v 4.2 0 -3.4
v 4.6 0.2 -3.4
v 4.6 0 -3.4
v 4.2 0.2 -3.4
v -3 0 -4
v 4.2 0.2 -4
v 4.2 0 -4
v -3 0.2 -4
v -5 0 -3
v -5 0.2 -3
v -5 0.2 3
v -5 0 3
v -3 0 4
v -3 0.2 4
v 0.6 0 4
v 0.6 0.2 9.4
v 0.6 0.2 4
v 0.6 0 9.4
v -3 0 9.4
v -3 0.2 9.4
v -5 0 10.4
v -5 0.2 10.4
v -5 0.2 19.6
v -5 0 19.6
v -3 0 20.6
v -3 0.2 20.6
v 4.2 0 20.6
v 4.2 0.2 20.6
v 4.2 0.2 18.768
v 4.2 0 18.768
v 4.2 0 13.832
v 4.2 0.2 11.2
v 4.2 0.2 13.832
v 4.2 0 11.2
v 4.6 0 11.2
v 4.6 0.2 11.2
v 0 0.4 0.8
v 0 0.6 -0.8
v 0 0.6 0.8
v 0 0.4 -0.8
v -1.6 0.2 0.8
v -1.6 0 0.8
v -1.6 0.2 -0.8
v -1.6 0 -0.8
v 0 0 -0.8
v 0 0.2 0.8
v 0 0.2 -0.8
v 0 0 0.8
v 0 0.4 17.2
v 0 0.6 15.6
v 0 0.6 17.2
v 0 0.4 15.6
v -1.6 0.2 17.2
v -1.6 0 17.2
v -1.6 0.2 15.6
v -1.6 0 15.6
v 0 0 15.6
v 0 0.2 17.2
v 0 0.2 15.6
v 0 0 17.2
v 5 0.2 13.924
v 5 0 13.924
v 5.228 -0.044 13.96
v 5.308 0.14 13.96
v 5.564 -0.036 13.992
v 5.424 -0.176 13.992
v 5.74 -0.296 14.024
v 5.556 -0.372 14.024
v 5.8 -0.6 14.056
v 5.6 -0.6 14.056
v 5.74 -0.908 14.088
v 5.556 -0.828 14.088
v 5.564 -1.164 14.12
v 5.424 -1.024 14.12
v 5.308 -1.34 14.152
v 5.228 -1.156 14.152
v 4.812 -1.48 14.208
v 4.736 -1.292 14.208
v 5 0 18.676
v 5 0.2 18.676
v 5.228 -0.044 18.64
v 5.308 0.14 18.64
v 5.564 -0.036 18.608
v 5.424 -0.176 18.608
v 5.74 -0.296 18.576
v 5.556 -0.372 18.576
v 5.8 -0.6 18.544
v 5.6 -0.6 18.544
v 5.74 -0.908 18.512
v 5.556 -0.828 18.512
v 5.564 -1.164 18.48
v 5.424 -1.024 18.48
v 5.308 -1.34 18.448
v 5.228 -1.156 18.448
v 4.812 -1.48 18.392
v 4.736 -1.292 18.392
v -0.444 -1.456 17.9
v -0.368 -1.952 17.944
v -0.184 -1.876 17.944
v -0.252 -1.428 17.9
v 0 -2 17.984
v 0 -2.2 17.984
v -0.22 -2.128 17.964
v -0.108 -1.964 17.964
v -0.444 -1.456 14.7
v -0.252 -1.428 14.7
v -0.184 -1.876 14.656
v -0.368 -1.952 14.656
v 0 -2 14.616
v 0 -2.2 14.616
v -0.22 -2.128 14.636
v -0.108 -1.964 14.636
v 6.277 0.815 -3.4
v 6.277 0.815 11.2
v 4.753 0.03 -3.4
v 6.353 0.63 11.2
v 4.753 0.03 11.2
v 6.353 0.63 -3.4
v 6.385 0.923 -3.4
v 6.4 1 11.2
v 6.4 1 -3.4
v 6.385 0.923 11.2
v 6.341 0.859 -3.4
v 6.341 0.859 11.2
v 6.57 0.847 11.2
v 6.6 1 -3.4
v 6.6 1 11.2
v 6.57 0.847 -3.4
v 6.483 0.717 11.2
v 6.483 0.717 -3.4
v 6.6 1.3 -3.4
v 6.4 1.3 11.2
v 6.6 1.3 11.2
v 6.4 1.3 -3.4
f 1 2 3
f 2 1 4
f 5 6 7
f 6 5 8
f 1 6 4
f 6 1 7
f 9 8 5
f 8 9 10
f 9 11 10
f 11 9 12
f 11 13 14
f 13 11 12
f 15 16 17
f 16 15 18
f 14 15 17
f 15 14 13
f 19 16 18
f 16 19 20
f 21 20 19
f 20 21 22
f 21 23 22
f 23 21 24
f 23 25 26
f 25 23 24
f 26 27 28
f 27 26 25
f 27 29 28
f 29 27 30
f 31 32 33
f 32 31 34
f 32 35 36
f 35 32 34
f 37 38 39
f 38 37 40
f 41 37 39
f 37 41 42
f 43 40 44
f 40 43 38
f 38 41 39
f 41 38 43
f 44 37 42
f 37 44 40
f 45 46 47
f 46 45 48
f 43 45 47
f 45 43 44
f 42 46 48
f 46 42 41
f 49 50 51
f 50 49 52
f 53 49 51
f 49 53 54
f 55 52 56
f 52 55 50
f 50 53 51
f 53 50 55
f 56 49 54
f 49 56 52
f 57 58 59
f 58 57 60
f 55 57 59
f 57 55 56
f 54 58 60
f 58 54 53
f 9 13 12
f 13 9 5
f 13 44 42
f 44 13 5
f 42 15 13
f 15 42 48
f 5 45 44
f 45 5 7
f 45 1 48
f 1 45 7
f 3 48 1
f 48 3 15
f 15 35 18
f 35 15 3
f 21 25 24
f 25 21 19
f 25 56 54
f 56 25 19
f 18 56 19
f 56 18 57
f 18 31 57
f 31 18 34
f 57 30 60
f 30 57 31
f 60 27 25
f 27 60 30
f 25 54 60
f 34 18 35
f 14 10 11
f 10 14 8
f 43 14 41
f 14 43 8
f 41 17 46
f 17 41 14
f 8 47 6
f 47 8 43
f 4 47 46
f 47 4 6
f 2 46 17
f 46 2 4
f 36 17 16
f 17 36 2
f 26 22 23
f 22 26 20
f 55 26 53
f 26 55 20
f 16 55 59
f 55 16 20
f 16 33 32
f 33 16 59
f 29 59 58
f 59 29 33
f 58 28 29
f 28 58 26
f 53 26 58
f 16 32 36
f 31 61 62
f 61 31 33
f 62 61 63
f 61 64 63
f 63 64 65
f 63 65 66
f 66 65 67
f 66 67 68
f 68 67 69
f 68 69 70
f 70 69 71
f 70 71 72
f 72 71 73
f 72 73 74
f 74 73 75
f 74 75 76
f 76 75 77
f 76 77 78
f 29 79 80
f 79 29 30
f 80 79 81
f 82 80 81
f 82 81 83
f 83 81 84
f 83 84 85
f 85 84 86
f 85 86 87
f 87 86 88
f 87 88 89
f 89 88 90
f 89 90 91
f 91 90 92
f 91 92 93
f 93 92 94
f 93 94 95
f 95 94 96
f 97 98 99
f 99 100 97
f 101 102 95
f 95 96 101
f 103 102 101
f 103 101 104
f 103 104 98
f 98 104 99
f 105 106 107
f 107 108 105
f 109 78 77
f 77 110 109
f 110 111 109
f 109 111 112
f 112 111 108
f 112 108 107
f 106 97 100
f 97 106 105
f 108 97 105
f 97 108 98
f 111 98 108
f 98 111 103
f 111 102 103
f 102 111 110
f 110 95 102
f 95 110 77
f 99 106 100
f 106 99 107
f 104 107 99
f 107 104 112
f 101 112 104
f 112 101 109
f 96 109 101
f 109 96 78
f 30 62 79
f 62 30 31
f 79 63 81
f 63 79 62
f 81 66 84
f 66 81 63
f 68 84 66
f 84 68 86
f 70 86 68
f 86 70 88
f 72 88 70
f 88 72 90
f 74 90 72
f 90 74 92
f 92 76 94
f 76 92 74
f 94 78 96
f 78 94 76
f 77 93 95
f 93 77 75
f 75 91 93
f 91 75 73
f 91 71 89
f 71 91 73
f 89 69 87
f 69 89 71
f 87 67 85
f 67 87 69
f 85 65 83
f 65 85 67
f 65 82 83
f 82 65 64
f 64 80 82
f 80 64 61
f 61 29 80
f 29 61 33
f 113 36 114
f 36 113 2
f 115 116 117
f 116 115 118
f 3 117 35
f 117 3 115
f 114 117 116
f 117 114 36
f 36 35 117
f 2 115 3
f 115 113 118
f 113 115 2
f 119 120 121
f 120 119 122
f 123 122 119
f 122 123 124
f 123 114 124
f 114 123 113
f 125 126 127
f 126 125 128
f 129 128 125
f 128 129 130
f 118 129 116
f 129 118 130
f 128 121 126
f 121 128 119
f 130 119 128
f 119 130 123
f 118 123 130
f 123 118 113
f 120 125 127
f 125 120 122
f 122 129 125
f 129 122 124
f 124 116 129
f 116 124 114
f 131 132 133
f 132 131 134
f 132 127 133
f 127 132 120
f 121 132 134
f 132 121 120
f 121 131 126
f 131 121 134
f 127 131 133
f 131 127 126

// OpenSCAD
// file: ../p/3-16edge.scad
use <../lib.scad>
function ldraw_lib__3_16edge() = [
// 0 Circle 0.1875
// 0 Name: 3-16edge.dat
// 0 Author: Donald Sutter [technog]
// 0 !LDRAW_ORG Primitive UPDATE 2017-01
// 0 !LICENSE Licensed under CC BY 4.0 : see CAreadme.txt
// 
// 0 BFC CERTIFY CCW
  [0,"BFC","CERTIFY"],
  [0,"BFC","CCW"],
// 
// 0 !HISTORY 2004-03-02 [PTadmin] Official Update 2004-01
// 0 !HISTORY 2007-06-24 [PTadmin] Header formatted for Contributor Agreement
// 0 !HISTORY 2008-07-01 [PTadmin] Official Update 2008-01
// 0 !HISTORY 2017-01-15 [Steffen] BFCed
// 0 !HISTORY 2017-12-30 [PTadmin] Official Update 2017-01
// 
// 
// 2 24 1 0 0 0.9239 0 0.3827
  [2,24,1,0,0,0.9239,0,0.3827],
// 2 24 0.9239 0 0.3827 0.7071 0 0.7071
  [2,24,0.9239,0,0.3827,0.7071,0,0.7071],
// 2 24 0.7071 0 0.7071 0.3827 0 0.9239
  [2,24,0.7071,0,0.7071,0.3827,0,0.9239],
];
module ldraw_lib__3_16edge(step=0, col=false, unit=2/5, alt=false, line=0.2, solid=!$preview)
    makepoly(ldraw_lib__3_16edge(), step=step, col=col, unit=unit, alt=alt, line=line, solid=solid);
ldraw_lib__3_16edge(line=0.2);
// file: ../p/3-16cyli.scad
use <../lib.scad>
function ldraw_lib__3_16cyli() = [
// 0 Cylinder 0.1875
// 0 Name: 3-16cyli.dat
// 0 Author: Mark Kennedy [mkennedy]
// 0 !LDRAW_ORG Primitive UPDATE 2005-01
// 0 !LICENSE Licensed under CC BY 4.0 : see CAreadme.txt
// 
// 0 BFC CERTIFY CCW
  [0,"BFC","CERTIFY"],
  [0,"BFC","CCW"],
// 
// 0 !HISTORY 2004-03-02 [PTadmin] Official Update 2004-01
// 0 !HISTORY 2004-12-11 [nielsk] Recreated using Primitive Generator, Edge lines fixed, BFC changed to CCW
// 0 !HISTORY 2005-12-28 [PTadmin] Official Update 2005-01
// 0 !HISTORY 2007-06-24 [PTadmin] Header formatted for Contributor Agreement
// 0 !HISTORY 2008-07-01 [PTadmin] Official Update 2008-01
// 
// 
// 4 16 .9239 1 .3827 .9239 0 .3827 1 0 0 1 1 0
  [4,16,.9239,1,.3827,.9239,0,.3827,1,0,0,1,1,0],
// 4 16 .7071 1 .7071 .7071 0 .7071 .9239 0 .3827 .9239 1 .3827
  [4,16,.7071,1,.7071,.7071,0,.7071,.9239,0,.3827,.9239,1,.3827],
// 4 16 .3827 1 .9239 .3827 0 .9239 .7071 0 .7071 .7071 1 .7071
  [4,16,.3827,1,.9239,.3827,0,.9239,.7071,0,.7071,.7071,1,.7071],
// 5 24 1 1 0 1 0 0 1 1 -.4142 .9239 1 .3827
  [5,24,1,1,0,1,0,0,1,1,-.4142,.9239,1,.3827],
// 5 24 .9239 1 .3827 .9239 0 .3827 1 1 0 .7071 1 .7071
  [5,24,.9239,1,.3827,.9239,0,.3827,1,1,0,.7071,1,.7071],
// 5 24 .7071 1 .7071 .7071 0 .7071 .9239 1 .3827 .3827 1 .9239
  [5,24,.7071,1,.7071,.7071,0,.7071,.9239,1,.3827,.3827,1,.9239],
// 5 24 .3827 1 .9239 .3827 0 .9239 .7071 1 .7071 0 1 1.0824
  [5,24,.3827,1,.9239,.3827,0,.9239,.7071,1,.7071,0,1,1.0824],
// 0
];
module ldraw_lib__3_16cyli(step=0, col=false, unit=2/5, alt=false, line=0.2, solid=!$preview)
    makepoly(ldraw_lib__3_16cyli(), step=step, col=col, unit=unit, alt=alt, line=line, solid=solid);
ldraw_lib__3_16cyli(line=0.2);
// file: ../p/rect2p.scad
use <../lib.scad>
function ldraw_lib__rect2p() = [
// 0 Rectangle with 2 Parallel Edges
// 0 Name: rect2p.dat
// 0 Author: Donald Sutter [technog]
// 0 !LDRAW_ORG Primitive UPDATE 2010-01
// 0 !LICENSE Licensed under CC BY 4.0 : see CAreadme.txt
// 
// 0 BFC CERTIFY CCW
  [0,"BFC","CERTIFY"],
  [0,"BFC","CCW"],
// 
// 0 !HISTORY 2003-08-01 [PTadmin] Official Update 2003-02
// 0 !HISTORY 2007-06-24 [PTadmin] Header formatted for Contributor Agreement
// 0 !HISTORY 2008-07-01 [PTadmin] Official Update 2008-01
// 0 !HISTORY 2010-01-17 [mikeheide] changed winding to CCW
// 0 !HISTORY 2010-04-05 [PTadmin] Official Update 2010-01
// 
// 
// 2 24 1 0 1 -1 0 1
  [2,24,1,0,1,-1,0,1],
// 2 24 -1 0 -1 1 0 -1
  [2,24,-1,0,-1,1,0,-1],
// 4 16 -1 0 1 -1 0 -1 1 0 -1 1 0 1
  [4,16,-1,0,1,-1,0,-1,1,0,-1,1,0,1],
// 0
];
module ldraw_lib__rect2p(step=0, col=false, unit=2/5, alt=false, line=0.2, solid=!$preview)
    makepoly(ldraw_lib__rect2p(), step=step, col=col, unit=unit, alt=alt, line=line, solid=solid);
ldraw_lib__rect2p(line=0.2);
// file: ../p/rect.scad
use <../lib.scad>
function ldraw_lib__rect() = [
// 0 Rectangle
// 0 Name: rect.dat
// 0 Author: James Jessiman
// 0 !LDRAW_ORG Primitive UPDATE 2010-01
// 0 !LICENSE Licensed under CC BY 4.0 : see CAreadme.txt
// 
// 0 BFC CERTIFY CCW
  [0,"BFC","CERTIFY"],
  [0,"BFC","CCW"],
// 
// 0 !HISTORY 2002-04-05 [hafhead] Added BFC statement
// 0 !HISTORY 2002-04-25 [PTadmin] Official Update 2002-02
// 0 !HISTORY 2007-06-24 [PTadmin] Header formatted for Contributor Agreement
// 0 !HISTORY 2008-07-01 [PTadmin] Official Update 2008-01
// 0 !HISTORY 2010-01-17 [mikeheide] changed winding to CCW
// 0 !HISTORY 2010-04-05 [PTadmin] Official Update 2010-01
// 
// 
// 2 24 1 0 1 -1 0 1
  [2,24,1,0,1,-1,0,1],
// 2 24 -1 0 1 -1 0 -1
  [2,24,-1,0,1,-1,0,-1],
// 2 24 -1 0 -1 1 0 -1
  [2,24,-1,0,-1,1,0,-1],
// 2 24 1 0 -1 1 0 1
  [2,24,1,0,-1,1,0,1],
// 4 16 -1 0 1 -1 0 -1 1 0 -1 1 0 1
  [4,16,-1,0,1,-1,0,-1,1,0,-1,1,0,1],
// 0
];
module ldraw_lib__rect(step=0, col=false, unit=2/5, alt=false, line=0.2, solid=!$preview)
    makepoly(ldraw_lib__rect(), step=step, col=col, unit=unit, alt=alt, line=line, solid=solid);
ldraw_lib__rect(line=0.2);
// file: ../p/box5-4a.scad
use <../lib.scad>
function ldraw_lib__box5_4a() = [
// 0 Box with  5 Faces without  4 Adjacent Edges
// 0 Name: box5-4a.dat
// 0 Author: Willy Tschager [Holly-Wood]
// 0 !LDRAW_ORG Primitive UPDATE 2024-01
// 0 !LICENSE Licensed under CC BY 4.0 : see CAreadme.txt
// 
// 0 BFC CERTIFY CCW
  [0,"BFC","CERTIFY"],
  [0,"BFC","CCW"],
// 
// 0 !HISTORY 2009-05-02 [PTadmin] Official Update 2009-01
// 0 !HISTORY 2024-01-03 [Holly-Wood] Complete re-write, original by guyvivan
// 0 !HISTORY 2024-01-29 [OrionP] Official Update 2024-01
// 
// 2 24 -1 1 -1 -1 1 1
  [2,24,-1,1,-1,-1,1,1],
// 2 24 1 1 1 1 1 -1
  [2,24,1,1,1,1,1,-1],
// 2 24 -1 1 1 1 1 1
  [2,24,-1,1,1,1,1,1],
// 2 24 -1 1 -1 1 1 -1
  [2,24,-1,1,-1,1,1,-1],
// 4 16 1 1 1 1 1 -1 -1 1 -1 -1 1 1
  [4,16,1,1,1,1,1,-1,-1,1,-1,-1,1,1],
// 
// 2 24 -1 0 -1 -1 1 -1
  [2,24,-1,0,-1,-1,1,-1],
// 2 24 -1 1 1 -1 0 1
  [2,24,-1,1,1,-1,0,1],
// 4 16 -1 1 1 -1 1 -1 -1 0 -1 -1 0 1
  [4,16,-1,1,1,-1,1,-1,-1,0,-1,-1,0,1],
// 
// 2 24 1 0 -1 1 1 -1
  [2,24,1,0,-1,1,1,-1],
// 2 24 1 1 1 1 0 1
  [2,24,1,1,1,1,0,1],
// 4 16 1 1 -1 1 1 1 1 0 1 1 0 -1
  [4,16,1,1,-1,1,1,1,1,0,1,1,0,-1],
// 
// 4 16 1 1 1 -1 1 1 -1 0 1 1 0 1
  [4,16,1,1,1,-1,1,1,-1,0,1,1,0,1],
// 4 16 -1 1 -1 1 1 -1 1 0 -1 -1 0 -1
  [4,16,-1,1,-1,1,1,-1,1,0,-1,-1,0,-1],
];
module ldraw_lib__box5_4a(step=0, col=false, unit=2/5, alt=false, line=0.2, solid=!$preview)
    makepoly(ldraw_lib__box5_4a(), step=step, col=col, unit=unit, alt=alt, line=line, solid=solid);
ldraw_lib__box5_4a(line=0.2);
// file: ../p/box5-2p.scad
use <../lib.scad>
function ldraw_lib__box5_2p() = [
// 0 Box with  5 Faces without  2 Parallel Edges
// 0 Name: box5-2p.dat
// 0 Author: Willy Tschager [Holly-Wood]
// 0 !LDRAW_ORG Primitive UPDATE 2024-01
// 0 !LICENSE Licensed under CC BY 4.0 : see CAreadme.txt
// 
// 0 BFC CERTIFY CCW
  [0,"BFC","CERTIFY"],
  [0,"BFC","CCW"],
// 
// 0 !HISTORY 2012-03-30 [PTadmin] Official Update 2012-01
// 0 !HISTORY 2024-01-04 [Holly-Wood] Complete re-write, original by Brickaneer
// 0 !HISTORY 2024-01-29 [OrionP] Official Update 2024-01
// 
// 2 24 -1 1 1 1 1 1
  [2,24,-1,1,1,1,1,1],
// 2 24 -1 1 -1 -1 1 1
  [2,24,-1,1,-1,-1,1,1],
// 2 24 1 1 -1 -1 1 -1
  [2,24,1,1,-1,-1,1,-1],
// 2 24 1 1 1 1 1 -1
  [2,24,1,1,1,1,1,-1],
// 4 16 1 1 1 1 1 -1 -1 1 -1 -1 1 1
  [4,16,1,1,1,1,1,-1,-1,1,-1,-1,1,1],
// 
// 2 24 -1 1 1 -1 0 1
  [2,24,-1,1,1,-1,0,1],
// 2 24 -1 1 -1 -1 0 -1
  [2,24,-1,1,-1,-1,0,-1],
// 2 24 -1 0 -1 -1 0 1
  [2,24,-1,0,-1,-1,0,1],
// 4 16 -1 1 1 -1 1 -1 -1 0 -1 -1 0 1
  [4,16,-1,1,1,-1,1,-1,-1,0,-1,-1,0,1],
// 
// 2 24 1 1 1 1 0 1
  [2,24,1,1,1,1,0,1],
// 2 24 1 1 -1 1 0 -1
  [2,24,1,1,-1,1,0,-1],
// 2 24 1 0 1 1 0 -1
  [2,24,1,0,1,1,0,-1],
// 4 16 1 1 -1 1 1 1 1 0 1 1 0 -1
  [4,16,1,1,-1,1,1,1,1,0,1,1,0,-1],
// 
// 4 16 1 1 1 -1 1 1 -1 0 1 1 0 1
  [4,16,1,1,1,-1,1,1,-1,0,1,1,0,1],
// 4 16 -1 1 -1 1 1 -1 1 0 -1 -1 0 -1
  [4,16,-1,1,-1,1,1,-1,1,0,-1,-1,0,-1],
];
module ldraw_lib__box5_2p(step=0, col=false, unit=2/5, alt=false, line=0.2, solid=!$preview)
    makepoly(ldraw_lib__box5_2p(), step=step, col=col, unit=unit, alt=alt, line=line, solid=solid);
ldraw_lib__box5_2p(line=0.2);
// file: ../p/box3u4a.scad
use <../lib.scad>
function ldraw_lib__box3u4a() = [
// 0 Box with 3 Faces without 4 Adjacent Edges
// 0 Name: box3u4a.dat
// 0 Author: Niels Karsdorp [nielsk]
// 0 !LDRAW_ORG Primitive UPDATE 2009-01
// 0 !LICENSE Licensed under CC BY 4.0 : see CAreadme.txt
// 
// 0 BFC CERTIFY CCW
  [0,"BFC","CERTIFY"],
  [0,"BFC","CCW"],
// 
// 0 !HISTORY 2009-05-02 [PTadmin] Official Update 2009-01
// 
// 
// 2 24 1 1 1 -1 1 1
  [2,24,1,1,1,-1,1,1],
// 2 24 -1 1 -1 1 1 -1
  [2,24,-1,1,-1,1,1,-1],
// 2 24 1 1 1 1 1 -1
  [2,24,1,1,1,1,1,-1],
// 2 24 -1 1 1 -1 1 -1
  [2,24,-1,1,1,-1,1,-1],
// 2 24 1 1 1 1 0 1
  [2,24,1,1,1,1,0,1],
// 2 24 1 1 -1 1 0 -1
  [2,24,1,1,-1,1,0,-1],
// 2 24 -1 1 1 -1 0 1
  [2,24,-1,1,1,-1,0,1],
// 2 24 -1 1 -1 -1 0 -1
  [2,24,-1,1,-1,-1,0,-1],
// 4 16 -1 1 -1 -1 1 1 1 1 1 1 1 -1
  [4,16,-1,1,-1,-1,1,1,1,1,1,1,1,-1],
// 4 16 -1 1 1 -1 0 1 1 0 1 1 1 1
  [4,16,-1,1,1,-1,0,1,1,0,1,1,1,1],
// 4 16 1 1 -1 1 0 -1 -1 0 -1 -1 1 -1
  [4,16,1,1,-1,1,0,-1,-1,0,-1,-1,1,-1],
// 0
];
module ldraw_lib__box3u4a(step=0, col=false, unit=2/5, alt=false, line=0.2, solid=!$preview)
    makepoly(ldraw_lib__box3u4a(), step=step, col=col, unit=unit, alt=alt, line=line, solid=solid);
ldraw_lib__box3u4a(line=0.2);
// file: ../p/box3u2p.scad
use <../lib.scad>
function ldraw_lib__box3u2p() = [
// 0 Box with 3 Faces without 2 Parallel Edges
// 0 Name: box3u2p.dat
// 0 Author: Niels Karsdorp [nielsk]
// 0 !LDRAW_ORG Primitive UPDATE 2012-01
// 0 !LICENSE Licensed under CC BY 4.0 : see CAreadme.txt
// 
// 0 BFC CERTIFY CCW
  [0,"BFC","CERTIFY"],
  [0,"BFC","CCW"],
// 
// 0 !HISTORY 2003-03-12 [PTadmin] Official Update 2003-01
// 0 !HISTORY 2007-06-24 [PTadmin] Header formatted for Contributor Agreement
// 0 !HISTORY 2008-07-01 [PTadmin] Official Update 2008-01
// 0 !HISTORY 2012-02-16 [Philo] Changed to CCW
// 0 !HISTORY 2012-03-30 [PTadmin] Official Update 2012-01
// 
// 
// 2 24 1 1 1 -1 1 1
  [2,24,1,1,1,-1,1,1],
// 2 24 -1 1 -1 1 1 -1
  [2,24,-1,1,-1,1,1,-1],
// 2 24 1 0 1 -1 0 1
  [2,24,1,0,1,-1,0,1],
// 2 24 -1 0 -1 1 0 -1
  [2,24,-1,0,-1,1,0,-1],
// 2 24 1 1 1 1 1 -1
  [2,24,1,1,1,1,1,-1],
// 2 24 -1 1 1 -1 1 -1
  [2,24,-1,1,1,-1,1,-1],
// 2 24 1 1 1 1 0 1
  [2,24,1,1,1,1,0,1],
// 2 24 1 1 -1 1 0 -1
  [2,24,1,1,-1,1,0,-1],
// 2 24 -1 1 1 -1 0 1
  [2,24,-1,1,1,-1,0,1],
// 2 24 -1 1 -1 -1 0 -1
  [2,24,-1,1,-1,-1,0,-1],
// 4 16 -1 1 -1 -1 1 1 1 1 1 1 1 -1
  [4,16,-1,1,-1,-1,1,1,1,1,1,1,1,-1],
// 4 16 -1 1 1 -1 0 1 1 0 1 1 1 1
  [4,16,-1,1,1,-1,0,1,1,0,1,1,1,1],
// 4 16 1 1 -1 1 0 -1 -1 0 -1 -1 1 -1
  [4,16,1,1,-1,1,0,-1,-1,0,-1,-1,1,-1],
];
module ldraw_lib__box3u2p(step=0, col=false, unit=2/5, alt=false, line=0.2, solid=!$preview)
    makepoly(ldraw_lib__box3u2p(), step=step, col=col, unit=unit, alt=alt, line=line, solid=solid);
ldraw_lib__box3u2p(line=0.2);
// file: ../p/box2-5.scad
use <../lib.scad>
function ldraw_lib__box2_5() = [
// 0 Box with 2 Faces without 5 Edges
// 0 Name: box2-5.dat
// 0 Author: Steffen [Steffen]
// 0 !LDRAW_ORG Primitive UPDATE 2003-03
// 0 !LICENSE Licensed under CC BY 4.0 : see CAreadme.txt
// 
// 0 BFC CERTIFY CCW
  [0,"BFC","CERTIFY"],
  [0,"BFC","CCW"],
// 
// 0 !HISTORY 2003-12-19 [PTadmin] Official Update 2003-03
// 0 !HISTORY 2007-06-24 [PTadmin] Header formatted for Contributor Agreement
// 0 !HISTORY 2008-07-01 [PTadmin] Official Update 2008-01
// 
// 
// 2 24 1 1 1 -1 1 1
  [2,24,1,1,1,-1,1,1],
// 2 24 1 1 -1 -1 1 -1
  [2,24,1,1,-1,-1,1,-1],
// 2 24 1 -1 1 -1 -1 1
  [2,24,1,-1,1,-1,-1,1],
// 2 24 -1 -1 1 -1 1 1
  [2,24,-1,-1,1,-1,1,1],
// 2 24 1 -1 1 1 1 1
  [2,24,1,-1,1,1,1,1],
// 2 24 -1 1 -1 -1 1 1
  [2,24,-1,1,-1,-1,1,1],
// 2 24 1 1 -1 1 1 1
  [2,24,1,1,-1,1,1,1],
// 4 16 1 1 1 1 1 -1 -1 1 -1 -1 1 1
  [4,16,1,1,1,1,1,-1,-1,1,-1,-1,1,1],
// 4 16 1 1 1 -1 1 1 -1 -1 1 1 -1 1
  [4,16,1,1,1,-1,1,1,-1,-1,1,1,-1,1],
// 0
];
module ldraw_lib__box2_5(step=0, col=false, unit=2/5, alt=false, line=0.2, solid=!$preview)
    makepoly(ldraw_lib__box2_5(), step=step, col=col, unit=unit, alt=alt, line=line, solid=solid);
ldraw_lib__box2_5(line=0.2);
// file: ../p/3-16ring1.scad
use <../lib.scad>
function ldraw_lib__3_16ring1() = [
// 0 Ring  1 x 0.1875
// 0 Name: 3-16ring1.dat
// 0 Author: Alex Taylor [anathema]
// 0 !LDRAW_ORG Primitive UPDATE 2024-02
// 0 !LICENSE Licensed under CC BY 4.0 : see CAreadme.txt
// 
// 0 BFC CERTIFY CCW
  [0,"BFC","CERTIFY"],
  [0,"BFC","CCW"],
// 
// 0 !HISTORY 2010-12-31 [PTadmin] Official Update 2010-03
// 0 !HISTORY 2024-03-23 [OrionP] Moved from 3-16rin1.dat
// 0 !HISTORY 2024-03-24 [OrionP] Official Update 2024-02
// 
// 4 16 1 0 0 2 0 0 1.8478 0 0.7654 0.9239 0 0.3827
  [4,16,1,0,0,2,0,0,1.8478,0,0.7654,0.9239,0,0.3827],
// 4 16 0.9239 0 0.3827 1.8478 0 0.7654 1.4142 0 1.4142 0.7071 0 0.7071
  [4,16,0.9239,0,0.3827,1.8478,0,0.7654,1.4142,0,1.4142,0.7071,0,0.7071],
// 4 16 0.7071 0 0.7071 1.4142 0 1.4142 0.7654 0 1.8478 0.3827 0 0.9239
  [4,16,0.7071,0,0.7071,1.4142,0,1.4142,0.7654,0,1.8478,0.3827,0,0.9239],
// 0
];
module ldraw_lib__3_16ring1(step=0, col=false, unit=2/5, alt=false, line=0.2, solid=!$preview)
    makepoly(ldraw_lib__3_16ring1(), step=step, col=col, unit=unit, alt=alt, line=line, solid=solid);
ldraw_lib__3_16ring1(line=0.2);
// file: ../p/3-16cylo.scad
use <../lib.scad>
use <3-16cyli.scad>
use <3-16edge.scad>
function ldraw_lib__3_16cylo() = [
// 0 Cylinder Open 0.1875
// 0 Name: 3-16cylo.dat
// 0 Author: J.C. Tchang [tchang]
// 0 !LDRAW_ORG Primitive UPDATE 2013-01
// 0 !LICENSE Licensed under CC BY 4.0 : see CAreadme.txt
// 
// 0 BFC CERTIFY CCW
  [0,"BFC","CERTIFY"],
  [0,"BFC","CCW"],
// 
// 0 !HISTORY 2013-07-21 [PTadmin] Official Update 2013-01
// 
// 
// 1 16 0 0 0 1 0 0 0 1 0 0 0 1 3-16edge.dat
  [1,16,0,0,0,1,0,0,0,1,0,0,0,1, ldraw_lib__3_16edge()],
// 1 16 0 1 0 1 0 0 0 1 0 0 0 1 3-16edge.dat
  [1,16,0,1,0,1,0,0,0,1,0,0,0,1, ldraw_lib__3_16edge()],
// 1 16 0 0 0 1 0 0 0 1 0 0 0 1 3-16cyli.dat
  [1,16,0,0,0,1,0,0,0,1,0,0,0,1, ldraw_lib__3_16cyli()],
];
module ldraw_lib__3_16cylo(step=0, col=false, unit=2/5, alt=false, line=0.2, solid=!$preview)
    makepoly(ldraw_lib__3_16cylo(), step=step, col=col, unit=unit, alt=alt, line=line, solid=solid);
ldraw_lib__3_16cylo(line=0.2);
// main file
use <../lib.scad>
use <../p/3-16cylo.scad>
use <../p/3-16ring1.scad>
use <../p/box2-5.scad>
use <../p/box3u2p.scad>
use <../p/box3u4a.scad>
use <../p/box5-2p.scad>
use <../p/box5-4a.scad>
use <../p/rect.scad>
use <../p/rect2p.scad>
use <s/u9641s01.scad>
function ldraw_lib__u9643() = [
// 0 ~Electric 9V Battery Box  4 x 14 x  4 Bottom - Contact Vertical Long
// 0 Name: u9643.dat
// 0 Author: Gerald Lasser [GeraldLasser]
// 0 !LDRAW_ORG Part UPDATE 2024-08
// 0 !LICENSE Licensed under CC BY 4.0 : see CAreadme.txt
// 
// 0 BFC CERTIFY CCW
  [0,"BFC","CERTIFY"],
  [0,"BFC","CCW"],
// 
// 0 !HISTORY 2024-09-30 [OrionP] Official Update 2024-08
// 
// 1 16 11 8.5 .25 .5 0 0 0 -1 0 0 0 -.25 rect2p.dat
  [1,16,11,8.5,.25,.5,0,0,0,-1,0,0,0,-.25, ldraw_lib__rect2p()],
// 1 16 1.5 9.25 .25 0 0 9 0 .75 0 .25 0 0 box2-5.dat
  [1,16,1.5,9.25,.25,0,0,9,0,.75,0,.25,0,0, ldraw_lib__box2_5()],
// 4 16 -12.5 7.5 .5 -7.5 10 .5 -7.5 10 0 -12.5 7.5 0
  [4,16,-12.5,7.5,.5,-7.5,10,.5,-7.5,10,0,-12.5,7.5,0],
// 2 24 -12.5 7.5 .5 -7.5 10 .5
  [2,24,-12.5,7.5,.5,-7.5,10,.5],
// 2 24 -7.5 10 0 -12.5 7.5 0
  [2,24,-7.5,10,0,-12.5,7.5,0],
// 1 16 -12.5 0 .25 0 1 0 0 0 7.5 .25 0 0 rect.dat
  [1,16,-12.5,0,.25,0,1,0,0,0,7.5,.25,0,0, ldraw_lib__rect()],
// 4 16 -7.5 -10 0 -7.5 -10 .5 -12.5 -7.5 .5 -12.5 -7.5 0
  [4,16,-7.5,-10,0,-7.5,-10,.5,-12.5,-7.5,.5,-12.5,-7.5,0],
// 2 24 -7.5 -10 0 -12.5 -7.5 0
  [2,24,-7.5,-10,0,-12.5,-7.5,0],
// 2 24 -12.5 -7.5 .5 -7.5 -10 .5
  [2,24,-12.5,-7.5,.5,-7.5,-10,.5],
// 0 BFC INVERTNEXT
  [0,"BFC","INVERTNEXT"],
// 1 16 -7.5 -16.75 .25 0 9 0 0 0 6.75 .25 0 0 box3u2p.dat
  [1,16,-7.5,-16.75,.25,0,9,0,0,0,6.75,.25,0,0, ldraw_lib__box3u2p()],
// 4 16 -12.5 -26 .5 -7.5 -23.5 .5 -7.5 -23.5 0 -12.5 -26 0
  [4,16,-12.5,-26,.5,-7.5,-23.5,.5,-7.5,-23.5,0,-12.5,-26,0],
// 2 24 -12.5 -26 .5 -7.5 -23.5 .5
  [2,24,-12.5,-26,.5,-7.5,-23.5,.5],
// 2 24 -7.5 -23.5 0 -12.5 -26 0
  [2,24,-7.5,-23.5,0,-12.5,-26,0],
// 1 16 -12.5 -37.5 .25 0 1 0 0 0 11.5 .25 0 0 rect.dat
  [1,16,-12.5,-37.5,.25,0,1,0,0,0,11.5,.25,0,0, ldraw_lib__rect()],
// 4 16 -7.5 -51.5 0 -7.5 -51.5 .5 -12.5 -49 .5 -12.5 -49 0
  [4,16,-7.5,-51.5,0,-7.5,-51.5,.5,-12.5,-49,.5,-12.5,-49,0],
// 2 24 -7.5 -51.5 0 -12.5 -49 0
  [2,24,-7.5,-51.5,0,-12.5,-49,0],
// 2 24 -12.5 -49 .5 -7.5 -51.5 .5
  [2,24,-12.5,-49,.5,-7.5,-51.5,.5],
// 1 16 1.5 -49.21 .25 0 0 9 0 -2.29 0 .25 0 0 box2-5.dat
  [1,16,1.5,-49.21,.25,0,0,9,0,-2.29,0,.25,0,0, ldraw_lib__box2_5()],
// 1 16 10.5 -31.29 .25 0 -1 0 3.29 0 0 0 0 .25 rect.dat
  [1,16,10.5,-31.29,.25,0,-1,0,3.29,0,0,0,0,.25, ldraw_lib__rect()],
// 1 16 11 -28 .25 .5 0 0 0 1 0 0 0 .25 rect2p.dat
  [1,16,11,-28,.25,.5,0,0,0,1,0,0,0,.25, ldraw_lib__rect2p()],
// 
// 1 16 -4 0 .25 0 4 0 2 0 0 0 1 .25 box5-2p.dat
  [1,16,-4,0,.25,0,4,0,2,0,0,0,1,.25, ldraw_lib__box5_2p()],
// 0 BFC INVERTNEXT
  [0,"BFC","INVERTNEXT"],
// 1 16 -4 0 .25 0 4 0 0 0 2 -.25 0 0 box3u4a.dat
  [1,16,-4,0,.25,0,4,0,0,0,2,-.25,0,0, ldraw_lib__box3u4a()],
// 1 16 -4 -41 .25 0 4 0 2 0 0 0 1 .25 box5-2p.dat
  [1,16,-4,-41,.25,0,4,0,2,0,0,0,1,.25, ldraw_lib__box5_2p()],
// 0 BFC INVERTNEXT
  [0,"BFC","INVERTNEXT"],
// 1 16 -4 -41 .25 0 4 0 0 0 2 -.25 0 0 box3u4a.dat
  [1,16,-4,-41,.25,0,4,0,0,0,2,-.25,0,0, ldraw_lib__box3u4a()],
// 
// 4 16 -7.5 -10 0 -12.5 -7.5 0 -12.5 7.5 0 -7.5 10 0
  [4,16,-7.5,-10,0,-12.5,-7.5,0,-12.5,7.5,0,-7.5,10,0],
// 4 16 -4 2 0 -4 -2 0 -7.5 -10 0 -7.5 10 0
  [4,16,-4,2,0,-4,-2,0,-7.5,-10,0,-7.5,10,0],
// 4 16 -7.5 -10 0 -4 -2 0 0 -2 0 1.5 -10 0
  [4,16,-7.5,-10,0,-4,-2,0,0,-2,0,1.5,-10,0],
// 4 16 0 2 0 -4 2 0 -7.5 10 0 10.5 10 0
  [4,16,0,2,0,-4,2,0,-7.5,10,0,10.5,10,0],
// 4 16 0 2 0 10.5 10 0 10.5 8.5 0 0 -2 0
  [4,16,0,2,0,10.5,10,0,10.5,8.5,0,0,-2,0],
// 4 16 1.5 -10 0 0 -2 0 10.5 8.5 0 11.5 8.5 0
  [4,16,1.5,-10,0,0,-2,0,10.5,8.5,0,11.5,8.5,0],
// 4 16 1.5 -23.5 0 1.5 -10 0 11.5 8.5 0 11.5 -28 0
  [4,16,1.5,-23.5,0,1.5,-10,0,11.5,8.5,0,11.5,-28,0],
// 4 16 -12.5 -26 0 -7.5 -23.5 0 -7.5 -51.5 0 -12.5 -49 0
  [4,16,-12.5,-26,0,-7.5,-23.5,0,-7.5,-51.5,0,-12.5,-49,0],
// 4 16 -4 -43 0 -7.5 -51.5 0 -7.5 -23.5 0 -4 -39 0
  [4,16,-4,-43,0,-7.5,-51.5,0,-7.5,-23.5,0,-4,-39,0],
// 4 16 0 -39 0 -4 -39 0 -7.5 -23.5 0 1.5 -23.5 0
  [4,16,0,-39,0,-4,-39,0,-7.5,-23.5,0,1.5,-23.5,0],
// 4 16 0 -39 0 1.5 -23.5 0 10.5 -28 0 10.5 -34.58 0
  [4,16,0,-39,0,1.5,-23.5,0,10.5,-28,0,10.5,-34.58,0],
// 4 16 0 -39 0 10.5 -34.58 0 10.5 -46.92 0 0 -43 0
  [4,16,0,-39,0,10.5,-34.58,0,10.5,-46.92,0,0,-43,0],
// 4 16 0 -43 0 10.5 -46.92 0 10.5 -51.5 0 -7.5 -51.5 0
  [4,16,0,-43,0,10.5,-46.92,0,10.5,-51.5,0,-7.5,-51.5,0],
// 3 16 -7.5 -51.5 0 -4 -43 0 0 -43 0
  [3,16,-7.5,-51.5,0,-4,-43,0,0,-43,0],
// 3 16 10.5 -28 0 1.5 -23.5 0 11.5 -28 0
  [3,16,10.5,-28,0,1.5,-23.5,0,11.5,-28,0],
// 
// 4 16 -12.5 7.5 .5 -12.5 -7.5 .5 -7.5 -10 .5 -7.5 10 .5
  [4,16,-12.5,7.5,.5,-12.5,-7.5,.5,-7.5,-10,.5,-7.5,10,.5],
// 4 16 -7.5 -10 .5 -4 -2 .5 -4 2 .5 -7.5 10 .5
  [4,16,-7.5,-10,.5,-4,-2,.5,-4,2,.5,-7.5,10,.5],
// 4 16 0 -2 .5 -4 -2 .5 -7.5 -10 .5 1.5 -10 .5
  [4,16,0,-2,.5,-4,-2,.5,-7.5,-10,.5,1.5,-10,.5],
// 4 16 -7.5 10 .5 -4 2 .5 0 2 .5 10.5 10 .5
  [4,16,-7.5,10,.5,-4,2,.5,0,2,.5,10.5,10,.5],
// 4 16 10.5 8.5 .5 10.5 10 .5 0 2 .5 0 -2 .5
  [4,16,10.5,8.5,.5,10.5,10,.5,0,2,.5,0,-2,.5],
// 4 16 10.5 8.5 .5 0 -2 .5 1.5 -10 .5 11.5 8.5 .5
  [4,16,10.5,8.5,.5,0,-2,.5,1.5,-10,.5,11.5,8.5,.5],
// 4 16 11.5 8.5 .5 1.5 -10 .5 1.5 -23.5 .5 11.5 -28 .5
  [4,16,11.5,8.5,.5,1.5,-10,.5,1.5,-23.5,.5,11.5,-28,.5],
// 4 16 -7.5 -51.5 .5 -7.5 -23.5 .5 -12.5 -26 .5 -12.5 -49 .5
  [4,16,-7.5,-51.5,.5,-7.5,-23.5,.5,-12.5,-26,.5,-12.5,-49,.5],
// 4 16 -7.5 -23.5 .5 -7.5 -51.5 .5 -4 -43 .5 -4 -39 .5
  [4,16,-7.5,-23.5,.5,-7.5,-51.5,.5,-4,-43,.5,-4,-39,.5],
// 4 16 -7.5 -23.5 .5 -4 -39 .5 0 -39 .5 1.5 -23.5 .5
  [4,16,-7.5,-23.5,.5,-4,-39,.5,0,-39,.5,1.5,-23.5,.5],
// 4 16 10.5 -28 .5 1.5 -23.5 .5 0 -39 .5 10.5 -34.58 .5
  [4,16,10.5,-28,.5,1.5,-23.5,.5,0,-39,.5,10.5,-34.58,.5],
// 4 16 10.5 -46.92 .5 10.5 -34.58 .5 0 -39 .5 0 -43 .5
  [4,16,10.5,-46.92,.5,10.5,-34.58,.5,0,-39,.5,0,-43,.5],
// 4 16 10.5 -51.5 .5 10.5 -46.92 .5 0 -43 .5 -7.5 -51.5 .5
  [4,16,10.5,-51.5,.5,10.5,-46.92,.5,0,-43,.5,-7.5,-51.5,.5],
// 3 16 -4 -43 .5 -7.5 -51.5 .5 0 -43 .5
  [3,16,-4,-43,.5,-7.5,-51.5,.5,0,-43,.5],
// 3 16 1.5 -23.5 .5 10.5 -28 .5 11.5 -28 .5
  [3,16,1.5,-23.5,.5,10.5,-28,.5,11.5,-28,.5],
// 
// 5 24 -4 -43 0 -4 -39 0 0 -39 1 -12.5 -49 0
  [5,24,-4,-43,0,-4,-39,0,0,-39,1,-12.5,-49,0],
// 5 24 -4 2 0 -4 -2 0 0 2 1 -12.5 -7.5 0
  [5,24,-4,2,0,-4,-2,0,0,2,1,-12.5,-7.5,0],
// 5 24 -4 -2 .5 -4 2 .5 0 2 1.5 -12.5 -7.5 .5
  [5,24,-4,-2,.5,-4,2,.5,0,2,1.5,-12.5,-7.5,.5],
// 5 24 -4 -43 .5 -4 -39 .5 0 -39 1.5 -12.5 -49 .5
  [5,24,-4,-43,.5,-4,-39,.5,0,-39,1.5,-12.5,-49,.5],
// 
// 1 16 0 -41 0 1 0 0 0 1 0 0 0 1 s\u9641s01.dat
  [1,16,0,-41,0,1,0,0,0,1,0,0,0,1, ldraw_lib__s__u9641s01()],
// 
// 4 16 15.69135 -28 2.03805 15.69135 8.5 2.03805 11.5 8.5 .5 11.5 -28 .5
  [4,16,15.69135,-28,2.03805,15.69135,8.5,2.03805,11.5,8.5,.5,11.5,-28,.5],
// 4 16 11.8827 -28 .0761 11.8827 8.5 .0761 15.8827 8.5 1.5761 15.8827 -28 1.5761
  [4,16,11.8827,-28,.0761,11.8827,8.5,.0761,15.8827,8.5,1.5761,15.8827,-28,1.5761],
// 4 16 11.8827 -28 .0761 11.5 -28 0 11.5 8.5 0 11.8827 8.5 .0761
  [4,16,11.8827,-28,.0761,11.5,-28,0,11.5,8.5,0,11.8827,8.5,.0761],
// 2 24 15.69135 -28 2.03805 11.5 -28 .5
  [2,24,15.69135,-28,2.03805,11.5,-28,.5],
// 2 24 11.8827 -28 .0761 15.8827 -28 1.5761
  [2,24,11.8827,-28,.0761,15.8827,-28,1.5761],
// 2 24 11.5 -28 0 11.8827 -28 .0761
  [2,24,11.5,-28,0,11.8827,-28,.0761],
// 4 16 11.8827 -28 .0761 15.8827 -28 1.5761 15.69135 -28 2.03805 11.5 -28 .5
  [4,16,11.8827,-28,.0761,15.8827,-28,1.5761,15.69135,-28,2.03805,11.5,-28,.5],
// 3 16 11.5 -28 .5 11.5 -28 0 11.8827 -28 .0761
  [3,16,11.5,-28,.5,11.5,-28,0,11.8827,-28,.0761],
// 2 24 15.69135 8.5 2.03805 11.5 8.5 .5
  [2,24,15.69135,8.5,2.03805,11.5,8.5,.5],
// 2 24 11.8827 8.5 .0761 15.8827 8.5 1.5761
  [2,24,11.8827,8.5,.0761,15.8827,8.5,1.5761],
// 2 24 11.5 8.5 0 11.8827 8.5 .0761
  [2,24,11.5,8.5,0,11.8827,8.5,.0761],
// 3 16 11.5 8.5 .5 11.8827 8.5 .0761 11.5 8.5 0
  [3,16,11.5,8.5,.5,11.8827,8.5,.0761,11.5,8.5,0],
// 4 16 15.69135 8.5 2.03805 15.8827 8.5 1.5761 11.8827 8.5 .0761 11.5 8.5 .5
  [4,16,15.69135,8.5,2.03805,15.8827,8.5,1.5761,11.8827,8.5,.0761,11.5,8.5,.5],
// 5 24 11.5 -28 0 11.5 8.5 0 10.5 -28 0 11.8827 -28 .0761
  [5,24,11.5,-28,0,11.5,8.5,0,10.5,-28,0,11.8827,-28,.0761],
// 5 24 11.8827 -28 .0761 11.8827 8.5 .0761 11.5 8.5 0 15.8827 8.5 1.5761
  [5,24,11.8827,-28,.0761,11.8827,8.5,.0761,11.5,8.5,0,15.8827,8.5,1.5761],
// 5 24 15.8827 -28 1.5761 15.8827 8.5 1.5761 16.2071 8.5 1.7929 11.8827 8.5 .0761
  [5,24,15.8827,-28,1.5761,15.8827,8.5,1.5761,16.2071,8.5,1.7929,11.8827,8.5,.0761],
// 0 BFC INVERTNEXT
  [0,"BFC","INVERTNEXT"],
// 1 16 15.5 8.5 2.5 .5 0 0 0 -36.5 0 0 0 -.5 3-16cylo.dat
  [1,16,15.5,8.5,2.5,.5,0,0,0,-36.5,0,0,0,-.5, ldraw_lib__3_16cylo()],
// 1 16 15.5 8.5 2.5 1 0 0 0 -36.5 0 0 0 -1 3-16cylo.dat
  [1,16,15.5,8.5,2.5,1,0,0,0,-36.5,0,0,0,-1, ldraw_lib__3_16cylo()],
// 1 16 15.5 8.5 2.5 .5 0 0 0 -1 0 0 0 -.5 3-16ring1.dat
  [1,16,15.5,8.5,2.5,.5,0,0,0,-1,0,0,0,-.5, ldraw_lib__3_16ring1()],
// 1 16 15.5 -28 2.5 .5 0 0 0 1 0 0 0 -.5 3-16ring1.dat
  [1,16,15.5,-28,2.5,.5,0,0,0,1,0,0,0,-.5, ldraw_lib__3_16ring1()],
// 1 16 16.25 -9.75 2.5 .25 0 0 0 0 -18.25 0 .75 0 box5-4a.dat
  [1,16,16.25,-9.75,2.5,.25,0,0,0,0,-18.25,0,.75,0, ldraw_lib__box5_4a()],
];
module ldraw_lib__u9643(step=0, col=false, unit=2/5, alt=false, line=0.2, solid=!$preview)
    makepoly(ldraw_lib__u9643(), step=step, col=col, unit=unit, alt=alt, line=line, solid=solid);
ldraw_lib__u9643(line=0.2);
